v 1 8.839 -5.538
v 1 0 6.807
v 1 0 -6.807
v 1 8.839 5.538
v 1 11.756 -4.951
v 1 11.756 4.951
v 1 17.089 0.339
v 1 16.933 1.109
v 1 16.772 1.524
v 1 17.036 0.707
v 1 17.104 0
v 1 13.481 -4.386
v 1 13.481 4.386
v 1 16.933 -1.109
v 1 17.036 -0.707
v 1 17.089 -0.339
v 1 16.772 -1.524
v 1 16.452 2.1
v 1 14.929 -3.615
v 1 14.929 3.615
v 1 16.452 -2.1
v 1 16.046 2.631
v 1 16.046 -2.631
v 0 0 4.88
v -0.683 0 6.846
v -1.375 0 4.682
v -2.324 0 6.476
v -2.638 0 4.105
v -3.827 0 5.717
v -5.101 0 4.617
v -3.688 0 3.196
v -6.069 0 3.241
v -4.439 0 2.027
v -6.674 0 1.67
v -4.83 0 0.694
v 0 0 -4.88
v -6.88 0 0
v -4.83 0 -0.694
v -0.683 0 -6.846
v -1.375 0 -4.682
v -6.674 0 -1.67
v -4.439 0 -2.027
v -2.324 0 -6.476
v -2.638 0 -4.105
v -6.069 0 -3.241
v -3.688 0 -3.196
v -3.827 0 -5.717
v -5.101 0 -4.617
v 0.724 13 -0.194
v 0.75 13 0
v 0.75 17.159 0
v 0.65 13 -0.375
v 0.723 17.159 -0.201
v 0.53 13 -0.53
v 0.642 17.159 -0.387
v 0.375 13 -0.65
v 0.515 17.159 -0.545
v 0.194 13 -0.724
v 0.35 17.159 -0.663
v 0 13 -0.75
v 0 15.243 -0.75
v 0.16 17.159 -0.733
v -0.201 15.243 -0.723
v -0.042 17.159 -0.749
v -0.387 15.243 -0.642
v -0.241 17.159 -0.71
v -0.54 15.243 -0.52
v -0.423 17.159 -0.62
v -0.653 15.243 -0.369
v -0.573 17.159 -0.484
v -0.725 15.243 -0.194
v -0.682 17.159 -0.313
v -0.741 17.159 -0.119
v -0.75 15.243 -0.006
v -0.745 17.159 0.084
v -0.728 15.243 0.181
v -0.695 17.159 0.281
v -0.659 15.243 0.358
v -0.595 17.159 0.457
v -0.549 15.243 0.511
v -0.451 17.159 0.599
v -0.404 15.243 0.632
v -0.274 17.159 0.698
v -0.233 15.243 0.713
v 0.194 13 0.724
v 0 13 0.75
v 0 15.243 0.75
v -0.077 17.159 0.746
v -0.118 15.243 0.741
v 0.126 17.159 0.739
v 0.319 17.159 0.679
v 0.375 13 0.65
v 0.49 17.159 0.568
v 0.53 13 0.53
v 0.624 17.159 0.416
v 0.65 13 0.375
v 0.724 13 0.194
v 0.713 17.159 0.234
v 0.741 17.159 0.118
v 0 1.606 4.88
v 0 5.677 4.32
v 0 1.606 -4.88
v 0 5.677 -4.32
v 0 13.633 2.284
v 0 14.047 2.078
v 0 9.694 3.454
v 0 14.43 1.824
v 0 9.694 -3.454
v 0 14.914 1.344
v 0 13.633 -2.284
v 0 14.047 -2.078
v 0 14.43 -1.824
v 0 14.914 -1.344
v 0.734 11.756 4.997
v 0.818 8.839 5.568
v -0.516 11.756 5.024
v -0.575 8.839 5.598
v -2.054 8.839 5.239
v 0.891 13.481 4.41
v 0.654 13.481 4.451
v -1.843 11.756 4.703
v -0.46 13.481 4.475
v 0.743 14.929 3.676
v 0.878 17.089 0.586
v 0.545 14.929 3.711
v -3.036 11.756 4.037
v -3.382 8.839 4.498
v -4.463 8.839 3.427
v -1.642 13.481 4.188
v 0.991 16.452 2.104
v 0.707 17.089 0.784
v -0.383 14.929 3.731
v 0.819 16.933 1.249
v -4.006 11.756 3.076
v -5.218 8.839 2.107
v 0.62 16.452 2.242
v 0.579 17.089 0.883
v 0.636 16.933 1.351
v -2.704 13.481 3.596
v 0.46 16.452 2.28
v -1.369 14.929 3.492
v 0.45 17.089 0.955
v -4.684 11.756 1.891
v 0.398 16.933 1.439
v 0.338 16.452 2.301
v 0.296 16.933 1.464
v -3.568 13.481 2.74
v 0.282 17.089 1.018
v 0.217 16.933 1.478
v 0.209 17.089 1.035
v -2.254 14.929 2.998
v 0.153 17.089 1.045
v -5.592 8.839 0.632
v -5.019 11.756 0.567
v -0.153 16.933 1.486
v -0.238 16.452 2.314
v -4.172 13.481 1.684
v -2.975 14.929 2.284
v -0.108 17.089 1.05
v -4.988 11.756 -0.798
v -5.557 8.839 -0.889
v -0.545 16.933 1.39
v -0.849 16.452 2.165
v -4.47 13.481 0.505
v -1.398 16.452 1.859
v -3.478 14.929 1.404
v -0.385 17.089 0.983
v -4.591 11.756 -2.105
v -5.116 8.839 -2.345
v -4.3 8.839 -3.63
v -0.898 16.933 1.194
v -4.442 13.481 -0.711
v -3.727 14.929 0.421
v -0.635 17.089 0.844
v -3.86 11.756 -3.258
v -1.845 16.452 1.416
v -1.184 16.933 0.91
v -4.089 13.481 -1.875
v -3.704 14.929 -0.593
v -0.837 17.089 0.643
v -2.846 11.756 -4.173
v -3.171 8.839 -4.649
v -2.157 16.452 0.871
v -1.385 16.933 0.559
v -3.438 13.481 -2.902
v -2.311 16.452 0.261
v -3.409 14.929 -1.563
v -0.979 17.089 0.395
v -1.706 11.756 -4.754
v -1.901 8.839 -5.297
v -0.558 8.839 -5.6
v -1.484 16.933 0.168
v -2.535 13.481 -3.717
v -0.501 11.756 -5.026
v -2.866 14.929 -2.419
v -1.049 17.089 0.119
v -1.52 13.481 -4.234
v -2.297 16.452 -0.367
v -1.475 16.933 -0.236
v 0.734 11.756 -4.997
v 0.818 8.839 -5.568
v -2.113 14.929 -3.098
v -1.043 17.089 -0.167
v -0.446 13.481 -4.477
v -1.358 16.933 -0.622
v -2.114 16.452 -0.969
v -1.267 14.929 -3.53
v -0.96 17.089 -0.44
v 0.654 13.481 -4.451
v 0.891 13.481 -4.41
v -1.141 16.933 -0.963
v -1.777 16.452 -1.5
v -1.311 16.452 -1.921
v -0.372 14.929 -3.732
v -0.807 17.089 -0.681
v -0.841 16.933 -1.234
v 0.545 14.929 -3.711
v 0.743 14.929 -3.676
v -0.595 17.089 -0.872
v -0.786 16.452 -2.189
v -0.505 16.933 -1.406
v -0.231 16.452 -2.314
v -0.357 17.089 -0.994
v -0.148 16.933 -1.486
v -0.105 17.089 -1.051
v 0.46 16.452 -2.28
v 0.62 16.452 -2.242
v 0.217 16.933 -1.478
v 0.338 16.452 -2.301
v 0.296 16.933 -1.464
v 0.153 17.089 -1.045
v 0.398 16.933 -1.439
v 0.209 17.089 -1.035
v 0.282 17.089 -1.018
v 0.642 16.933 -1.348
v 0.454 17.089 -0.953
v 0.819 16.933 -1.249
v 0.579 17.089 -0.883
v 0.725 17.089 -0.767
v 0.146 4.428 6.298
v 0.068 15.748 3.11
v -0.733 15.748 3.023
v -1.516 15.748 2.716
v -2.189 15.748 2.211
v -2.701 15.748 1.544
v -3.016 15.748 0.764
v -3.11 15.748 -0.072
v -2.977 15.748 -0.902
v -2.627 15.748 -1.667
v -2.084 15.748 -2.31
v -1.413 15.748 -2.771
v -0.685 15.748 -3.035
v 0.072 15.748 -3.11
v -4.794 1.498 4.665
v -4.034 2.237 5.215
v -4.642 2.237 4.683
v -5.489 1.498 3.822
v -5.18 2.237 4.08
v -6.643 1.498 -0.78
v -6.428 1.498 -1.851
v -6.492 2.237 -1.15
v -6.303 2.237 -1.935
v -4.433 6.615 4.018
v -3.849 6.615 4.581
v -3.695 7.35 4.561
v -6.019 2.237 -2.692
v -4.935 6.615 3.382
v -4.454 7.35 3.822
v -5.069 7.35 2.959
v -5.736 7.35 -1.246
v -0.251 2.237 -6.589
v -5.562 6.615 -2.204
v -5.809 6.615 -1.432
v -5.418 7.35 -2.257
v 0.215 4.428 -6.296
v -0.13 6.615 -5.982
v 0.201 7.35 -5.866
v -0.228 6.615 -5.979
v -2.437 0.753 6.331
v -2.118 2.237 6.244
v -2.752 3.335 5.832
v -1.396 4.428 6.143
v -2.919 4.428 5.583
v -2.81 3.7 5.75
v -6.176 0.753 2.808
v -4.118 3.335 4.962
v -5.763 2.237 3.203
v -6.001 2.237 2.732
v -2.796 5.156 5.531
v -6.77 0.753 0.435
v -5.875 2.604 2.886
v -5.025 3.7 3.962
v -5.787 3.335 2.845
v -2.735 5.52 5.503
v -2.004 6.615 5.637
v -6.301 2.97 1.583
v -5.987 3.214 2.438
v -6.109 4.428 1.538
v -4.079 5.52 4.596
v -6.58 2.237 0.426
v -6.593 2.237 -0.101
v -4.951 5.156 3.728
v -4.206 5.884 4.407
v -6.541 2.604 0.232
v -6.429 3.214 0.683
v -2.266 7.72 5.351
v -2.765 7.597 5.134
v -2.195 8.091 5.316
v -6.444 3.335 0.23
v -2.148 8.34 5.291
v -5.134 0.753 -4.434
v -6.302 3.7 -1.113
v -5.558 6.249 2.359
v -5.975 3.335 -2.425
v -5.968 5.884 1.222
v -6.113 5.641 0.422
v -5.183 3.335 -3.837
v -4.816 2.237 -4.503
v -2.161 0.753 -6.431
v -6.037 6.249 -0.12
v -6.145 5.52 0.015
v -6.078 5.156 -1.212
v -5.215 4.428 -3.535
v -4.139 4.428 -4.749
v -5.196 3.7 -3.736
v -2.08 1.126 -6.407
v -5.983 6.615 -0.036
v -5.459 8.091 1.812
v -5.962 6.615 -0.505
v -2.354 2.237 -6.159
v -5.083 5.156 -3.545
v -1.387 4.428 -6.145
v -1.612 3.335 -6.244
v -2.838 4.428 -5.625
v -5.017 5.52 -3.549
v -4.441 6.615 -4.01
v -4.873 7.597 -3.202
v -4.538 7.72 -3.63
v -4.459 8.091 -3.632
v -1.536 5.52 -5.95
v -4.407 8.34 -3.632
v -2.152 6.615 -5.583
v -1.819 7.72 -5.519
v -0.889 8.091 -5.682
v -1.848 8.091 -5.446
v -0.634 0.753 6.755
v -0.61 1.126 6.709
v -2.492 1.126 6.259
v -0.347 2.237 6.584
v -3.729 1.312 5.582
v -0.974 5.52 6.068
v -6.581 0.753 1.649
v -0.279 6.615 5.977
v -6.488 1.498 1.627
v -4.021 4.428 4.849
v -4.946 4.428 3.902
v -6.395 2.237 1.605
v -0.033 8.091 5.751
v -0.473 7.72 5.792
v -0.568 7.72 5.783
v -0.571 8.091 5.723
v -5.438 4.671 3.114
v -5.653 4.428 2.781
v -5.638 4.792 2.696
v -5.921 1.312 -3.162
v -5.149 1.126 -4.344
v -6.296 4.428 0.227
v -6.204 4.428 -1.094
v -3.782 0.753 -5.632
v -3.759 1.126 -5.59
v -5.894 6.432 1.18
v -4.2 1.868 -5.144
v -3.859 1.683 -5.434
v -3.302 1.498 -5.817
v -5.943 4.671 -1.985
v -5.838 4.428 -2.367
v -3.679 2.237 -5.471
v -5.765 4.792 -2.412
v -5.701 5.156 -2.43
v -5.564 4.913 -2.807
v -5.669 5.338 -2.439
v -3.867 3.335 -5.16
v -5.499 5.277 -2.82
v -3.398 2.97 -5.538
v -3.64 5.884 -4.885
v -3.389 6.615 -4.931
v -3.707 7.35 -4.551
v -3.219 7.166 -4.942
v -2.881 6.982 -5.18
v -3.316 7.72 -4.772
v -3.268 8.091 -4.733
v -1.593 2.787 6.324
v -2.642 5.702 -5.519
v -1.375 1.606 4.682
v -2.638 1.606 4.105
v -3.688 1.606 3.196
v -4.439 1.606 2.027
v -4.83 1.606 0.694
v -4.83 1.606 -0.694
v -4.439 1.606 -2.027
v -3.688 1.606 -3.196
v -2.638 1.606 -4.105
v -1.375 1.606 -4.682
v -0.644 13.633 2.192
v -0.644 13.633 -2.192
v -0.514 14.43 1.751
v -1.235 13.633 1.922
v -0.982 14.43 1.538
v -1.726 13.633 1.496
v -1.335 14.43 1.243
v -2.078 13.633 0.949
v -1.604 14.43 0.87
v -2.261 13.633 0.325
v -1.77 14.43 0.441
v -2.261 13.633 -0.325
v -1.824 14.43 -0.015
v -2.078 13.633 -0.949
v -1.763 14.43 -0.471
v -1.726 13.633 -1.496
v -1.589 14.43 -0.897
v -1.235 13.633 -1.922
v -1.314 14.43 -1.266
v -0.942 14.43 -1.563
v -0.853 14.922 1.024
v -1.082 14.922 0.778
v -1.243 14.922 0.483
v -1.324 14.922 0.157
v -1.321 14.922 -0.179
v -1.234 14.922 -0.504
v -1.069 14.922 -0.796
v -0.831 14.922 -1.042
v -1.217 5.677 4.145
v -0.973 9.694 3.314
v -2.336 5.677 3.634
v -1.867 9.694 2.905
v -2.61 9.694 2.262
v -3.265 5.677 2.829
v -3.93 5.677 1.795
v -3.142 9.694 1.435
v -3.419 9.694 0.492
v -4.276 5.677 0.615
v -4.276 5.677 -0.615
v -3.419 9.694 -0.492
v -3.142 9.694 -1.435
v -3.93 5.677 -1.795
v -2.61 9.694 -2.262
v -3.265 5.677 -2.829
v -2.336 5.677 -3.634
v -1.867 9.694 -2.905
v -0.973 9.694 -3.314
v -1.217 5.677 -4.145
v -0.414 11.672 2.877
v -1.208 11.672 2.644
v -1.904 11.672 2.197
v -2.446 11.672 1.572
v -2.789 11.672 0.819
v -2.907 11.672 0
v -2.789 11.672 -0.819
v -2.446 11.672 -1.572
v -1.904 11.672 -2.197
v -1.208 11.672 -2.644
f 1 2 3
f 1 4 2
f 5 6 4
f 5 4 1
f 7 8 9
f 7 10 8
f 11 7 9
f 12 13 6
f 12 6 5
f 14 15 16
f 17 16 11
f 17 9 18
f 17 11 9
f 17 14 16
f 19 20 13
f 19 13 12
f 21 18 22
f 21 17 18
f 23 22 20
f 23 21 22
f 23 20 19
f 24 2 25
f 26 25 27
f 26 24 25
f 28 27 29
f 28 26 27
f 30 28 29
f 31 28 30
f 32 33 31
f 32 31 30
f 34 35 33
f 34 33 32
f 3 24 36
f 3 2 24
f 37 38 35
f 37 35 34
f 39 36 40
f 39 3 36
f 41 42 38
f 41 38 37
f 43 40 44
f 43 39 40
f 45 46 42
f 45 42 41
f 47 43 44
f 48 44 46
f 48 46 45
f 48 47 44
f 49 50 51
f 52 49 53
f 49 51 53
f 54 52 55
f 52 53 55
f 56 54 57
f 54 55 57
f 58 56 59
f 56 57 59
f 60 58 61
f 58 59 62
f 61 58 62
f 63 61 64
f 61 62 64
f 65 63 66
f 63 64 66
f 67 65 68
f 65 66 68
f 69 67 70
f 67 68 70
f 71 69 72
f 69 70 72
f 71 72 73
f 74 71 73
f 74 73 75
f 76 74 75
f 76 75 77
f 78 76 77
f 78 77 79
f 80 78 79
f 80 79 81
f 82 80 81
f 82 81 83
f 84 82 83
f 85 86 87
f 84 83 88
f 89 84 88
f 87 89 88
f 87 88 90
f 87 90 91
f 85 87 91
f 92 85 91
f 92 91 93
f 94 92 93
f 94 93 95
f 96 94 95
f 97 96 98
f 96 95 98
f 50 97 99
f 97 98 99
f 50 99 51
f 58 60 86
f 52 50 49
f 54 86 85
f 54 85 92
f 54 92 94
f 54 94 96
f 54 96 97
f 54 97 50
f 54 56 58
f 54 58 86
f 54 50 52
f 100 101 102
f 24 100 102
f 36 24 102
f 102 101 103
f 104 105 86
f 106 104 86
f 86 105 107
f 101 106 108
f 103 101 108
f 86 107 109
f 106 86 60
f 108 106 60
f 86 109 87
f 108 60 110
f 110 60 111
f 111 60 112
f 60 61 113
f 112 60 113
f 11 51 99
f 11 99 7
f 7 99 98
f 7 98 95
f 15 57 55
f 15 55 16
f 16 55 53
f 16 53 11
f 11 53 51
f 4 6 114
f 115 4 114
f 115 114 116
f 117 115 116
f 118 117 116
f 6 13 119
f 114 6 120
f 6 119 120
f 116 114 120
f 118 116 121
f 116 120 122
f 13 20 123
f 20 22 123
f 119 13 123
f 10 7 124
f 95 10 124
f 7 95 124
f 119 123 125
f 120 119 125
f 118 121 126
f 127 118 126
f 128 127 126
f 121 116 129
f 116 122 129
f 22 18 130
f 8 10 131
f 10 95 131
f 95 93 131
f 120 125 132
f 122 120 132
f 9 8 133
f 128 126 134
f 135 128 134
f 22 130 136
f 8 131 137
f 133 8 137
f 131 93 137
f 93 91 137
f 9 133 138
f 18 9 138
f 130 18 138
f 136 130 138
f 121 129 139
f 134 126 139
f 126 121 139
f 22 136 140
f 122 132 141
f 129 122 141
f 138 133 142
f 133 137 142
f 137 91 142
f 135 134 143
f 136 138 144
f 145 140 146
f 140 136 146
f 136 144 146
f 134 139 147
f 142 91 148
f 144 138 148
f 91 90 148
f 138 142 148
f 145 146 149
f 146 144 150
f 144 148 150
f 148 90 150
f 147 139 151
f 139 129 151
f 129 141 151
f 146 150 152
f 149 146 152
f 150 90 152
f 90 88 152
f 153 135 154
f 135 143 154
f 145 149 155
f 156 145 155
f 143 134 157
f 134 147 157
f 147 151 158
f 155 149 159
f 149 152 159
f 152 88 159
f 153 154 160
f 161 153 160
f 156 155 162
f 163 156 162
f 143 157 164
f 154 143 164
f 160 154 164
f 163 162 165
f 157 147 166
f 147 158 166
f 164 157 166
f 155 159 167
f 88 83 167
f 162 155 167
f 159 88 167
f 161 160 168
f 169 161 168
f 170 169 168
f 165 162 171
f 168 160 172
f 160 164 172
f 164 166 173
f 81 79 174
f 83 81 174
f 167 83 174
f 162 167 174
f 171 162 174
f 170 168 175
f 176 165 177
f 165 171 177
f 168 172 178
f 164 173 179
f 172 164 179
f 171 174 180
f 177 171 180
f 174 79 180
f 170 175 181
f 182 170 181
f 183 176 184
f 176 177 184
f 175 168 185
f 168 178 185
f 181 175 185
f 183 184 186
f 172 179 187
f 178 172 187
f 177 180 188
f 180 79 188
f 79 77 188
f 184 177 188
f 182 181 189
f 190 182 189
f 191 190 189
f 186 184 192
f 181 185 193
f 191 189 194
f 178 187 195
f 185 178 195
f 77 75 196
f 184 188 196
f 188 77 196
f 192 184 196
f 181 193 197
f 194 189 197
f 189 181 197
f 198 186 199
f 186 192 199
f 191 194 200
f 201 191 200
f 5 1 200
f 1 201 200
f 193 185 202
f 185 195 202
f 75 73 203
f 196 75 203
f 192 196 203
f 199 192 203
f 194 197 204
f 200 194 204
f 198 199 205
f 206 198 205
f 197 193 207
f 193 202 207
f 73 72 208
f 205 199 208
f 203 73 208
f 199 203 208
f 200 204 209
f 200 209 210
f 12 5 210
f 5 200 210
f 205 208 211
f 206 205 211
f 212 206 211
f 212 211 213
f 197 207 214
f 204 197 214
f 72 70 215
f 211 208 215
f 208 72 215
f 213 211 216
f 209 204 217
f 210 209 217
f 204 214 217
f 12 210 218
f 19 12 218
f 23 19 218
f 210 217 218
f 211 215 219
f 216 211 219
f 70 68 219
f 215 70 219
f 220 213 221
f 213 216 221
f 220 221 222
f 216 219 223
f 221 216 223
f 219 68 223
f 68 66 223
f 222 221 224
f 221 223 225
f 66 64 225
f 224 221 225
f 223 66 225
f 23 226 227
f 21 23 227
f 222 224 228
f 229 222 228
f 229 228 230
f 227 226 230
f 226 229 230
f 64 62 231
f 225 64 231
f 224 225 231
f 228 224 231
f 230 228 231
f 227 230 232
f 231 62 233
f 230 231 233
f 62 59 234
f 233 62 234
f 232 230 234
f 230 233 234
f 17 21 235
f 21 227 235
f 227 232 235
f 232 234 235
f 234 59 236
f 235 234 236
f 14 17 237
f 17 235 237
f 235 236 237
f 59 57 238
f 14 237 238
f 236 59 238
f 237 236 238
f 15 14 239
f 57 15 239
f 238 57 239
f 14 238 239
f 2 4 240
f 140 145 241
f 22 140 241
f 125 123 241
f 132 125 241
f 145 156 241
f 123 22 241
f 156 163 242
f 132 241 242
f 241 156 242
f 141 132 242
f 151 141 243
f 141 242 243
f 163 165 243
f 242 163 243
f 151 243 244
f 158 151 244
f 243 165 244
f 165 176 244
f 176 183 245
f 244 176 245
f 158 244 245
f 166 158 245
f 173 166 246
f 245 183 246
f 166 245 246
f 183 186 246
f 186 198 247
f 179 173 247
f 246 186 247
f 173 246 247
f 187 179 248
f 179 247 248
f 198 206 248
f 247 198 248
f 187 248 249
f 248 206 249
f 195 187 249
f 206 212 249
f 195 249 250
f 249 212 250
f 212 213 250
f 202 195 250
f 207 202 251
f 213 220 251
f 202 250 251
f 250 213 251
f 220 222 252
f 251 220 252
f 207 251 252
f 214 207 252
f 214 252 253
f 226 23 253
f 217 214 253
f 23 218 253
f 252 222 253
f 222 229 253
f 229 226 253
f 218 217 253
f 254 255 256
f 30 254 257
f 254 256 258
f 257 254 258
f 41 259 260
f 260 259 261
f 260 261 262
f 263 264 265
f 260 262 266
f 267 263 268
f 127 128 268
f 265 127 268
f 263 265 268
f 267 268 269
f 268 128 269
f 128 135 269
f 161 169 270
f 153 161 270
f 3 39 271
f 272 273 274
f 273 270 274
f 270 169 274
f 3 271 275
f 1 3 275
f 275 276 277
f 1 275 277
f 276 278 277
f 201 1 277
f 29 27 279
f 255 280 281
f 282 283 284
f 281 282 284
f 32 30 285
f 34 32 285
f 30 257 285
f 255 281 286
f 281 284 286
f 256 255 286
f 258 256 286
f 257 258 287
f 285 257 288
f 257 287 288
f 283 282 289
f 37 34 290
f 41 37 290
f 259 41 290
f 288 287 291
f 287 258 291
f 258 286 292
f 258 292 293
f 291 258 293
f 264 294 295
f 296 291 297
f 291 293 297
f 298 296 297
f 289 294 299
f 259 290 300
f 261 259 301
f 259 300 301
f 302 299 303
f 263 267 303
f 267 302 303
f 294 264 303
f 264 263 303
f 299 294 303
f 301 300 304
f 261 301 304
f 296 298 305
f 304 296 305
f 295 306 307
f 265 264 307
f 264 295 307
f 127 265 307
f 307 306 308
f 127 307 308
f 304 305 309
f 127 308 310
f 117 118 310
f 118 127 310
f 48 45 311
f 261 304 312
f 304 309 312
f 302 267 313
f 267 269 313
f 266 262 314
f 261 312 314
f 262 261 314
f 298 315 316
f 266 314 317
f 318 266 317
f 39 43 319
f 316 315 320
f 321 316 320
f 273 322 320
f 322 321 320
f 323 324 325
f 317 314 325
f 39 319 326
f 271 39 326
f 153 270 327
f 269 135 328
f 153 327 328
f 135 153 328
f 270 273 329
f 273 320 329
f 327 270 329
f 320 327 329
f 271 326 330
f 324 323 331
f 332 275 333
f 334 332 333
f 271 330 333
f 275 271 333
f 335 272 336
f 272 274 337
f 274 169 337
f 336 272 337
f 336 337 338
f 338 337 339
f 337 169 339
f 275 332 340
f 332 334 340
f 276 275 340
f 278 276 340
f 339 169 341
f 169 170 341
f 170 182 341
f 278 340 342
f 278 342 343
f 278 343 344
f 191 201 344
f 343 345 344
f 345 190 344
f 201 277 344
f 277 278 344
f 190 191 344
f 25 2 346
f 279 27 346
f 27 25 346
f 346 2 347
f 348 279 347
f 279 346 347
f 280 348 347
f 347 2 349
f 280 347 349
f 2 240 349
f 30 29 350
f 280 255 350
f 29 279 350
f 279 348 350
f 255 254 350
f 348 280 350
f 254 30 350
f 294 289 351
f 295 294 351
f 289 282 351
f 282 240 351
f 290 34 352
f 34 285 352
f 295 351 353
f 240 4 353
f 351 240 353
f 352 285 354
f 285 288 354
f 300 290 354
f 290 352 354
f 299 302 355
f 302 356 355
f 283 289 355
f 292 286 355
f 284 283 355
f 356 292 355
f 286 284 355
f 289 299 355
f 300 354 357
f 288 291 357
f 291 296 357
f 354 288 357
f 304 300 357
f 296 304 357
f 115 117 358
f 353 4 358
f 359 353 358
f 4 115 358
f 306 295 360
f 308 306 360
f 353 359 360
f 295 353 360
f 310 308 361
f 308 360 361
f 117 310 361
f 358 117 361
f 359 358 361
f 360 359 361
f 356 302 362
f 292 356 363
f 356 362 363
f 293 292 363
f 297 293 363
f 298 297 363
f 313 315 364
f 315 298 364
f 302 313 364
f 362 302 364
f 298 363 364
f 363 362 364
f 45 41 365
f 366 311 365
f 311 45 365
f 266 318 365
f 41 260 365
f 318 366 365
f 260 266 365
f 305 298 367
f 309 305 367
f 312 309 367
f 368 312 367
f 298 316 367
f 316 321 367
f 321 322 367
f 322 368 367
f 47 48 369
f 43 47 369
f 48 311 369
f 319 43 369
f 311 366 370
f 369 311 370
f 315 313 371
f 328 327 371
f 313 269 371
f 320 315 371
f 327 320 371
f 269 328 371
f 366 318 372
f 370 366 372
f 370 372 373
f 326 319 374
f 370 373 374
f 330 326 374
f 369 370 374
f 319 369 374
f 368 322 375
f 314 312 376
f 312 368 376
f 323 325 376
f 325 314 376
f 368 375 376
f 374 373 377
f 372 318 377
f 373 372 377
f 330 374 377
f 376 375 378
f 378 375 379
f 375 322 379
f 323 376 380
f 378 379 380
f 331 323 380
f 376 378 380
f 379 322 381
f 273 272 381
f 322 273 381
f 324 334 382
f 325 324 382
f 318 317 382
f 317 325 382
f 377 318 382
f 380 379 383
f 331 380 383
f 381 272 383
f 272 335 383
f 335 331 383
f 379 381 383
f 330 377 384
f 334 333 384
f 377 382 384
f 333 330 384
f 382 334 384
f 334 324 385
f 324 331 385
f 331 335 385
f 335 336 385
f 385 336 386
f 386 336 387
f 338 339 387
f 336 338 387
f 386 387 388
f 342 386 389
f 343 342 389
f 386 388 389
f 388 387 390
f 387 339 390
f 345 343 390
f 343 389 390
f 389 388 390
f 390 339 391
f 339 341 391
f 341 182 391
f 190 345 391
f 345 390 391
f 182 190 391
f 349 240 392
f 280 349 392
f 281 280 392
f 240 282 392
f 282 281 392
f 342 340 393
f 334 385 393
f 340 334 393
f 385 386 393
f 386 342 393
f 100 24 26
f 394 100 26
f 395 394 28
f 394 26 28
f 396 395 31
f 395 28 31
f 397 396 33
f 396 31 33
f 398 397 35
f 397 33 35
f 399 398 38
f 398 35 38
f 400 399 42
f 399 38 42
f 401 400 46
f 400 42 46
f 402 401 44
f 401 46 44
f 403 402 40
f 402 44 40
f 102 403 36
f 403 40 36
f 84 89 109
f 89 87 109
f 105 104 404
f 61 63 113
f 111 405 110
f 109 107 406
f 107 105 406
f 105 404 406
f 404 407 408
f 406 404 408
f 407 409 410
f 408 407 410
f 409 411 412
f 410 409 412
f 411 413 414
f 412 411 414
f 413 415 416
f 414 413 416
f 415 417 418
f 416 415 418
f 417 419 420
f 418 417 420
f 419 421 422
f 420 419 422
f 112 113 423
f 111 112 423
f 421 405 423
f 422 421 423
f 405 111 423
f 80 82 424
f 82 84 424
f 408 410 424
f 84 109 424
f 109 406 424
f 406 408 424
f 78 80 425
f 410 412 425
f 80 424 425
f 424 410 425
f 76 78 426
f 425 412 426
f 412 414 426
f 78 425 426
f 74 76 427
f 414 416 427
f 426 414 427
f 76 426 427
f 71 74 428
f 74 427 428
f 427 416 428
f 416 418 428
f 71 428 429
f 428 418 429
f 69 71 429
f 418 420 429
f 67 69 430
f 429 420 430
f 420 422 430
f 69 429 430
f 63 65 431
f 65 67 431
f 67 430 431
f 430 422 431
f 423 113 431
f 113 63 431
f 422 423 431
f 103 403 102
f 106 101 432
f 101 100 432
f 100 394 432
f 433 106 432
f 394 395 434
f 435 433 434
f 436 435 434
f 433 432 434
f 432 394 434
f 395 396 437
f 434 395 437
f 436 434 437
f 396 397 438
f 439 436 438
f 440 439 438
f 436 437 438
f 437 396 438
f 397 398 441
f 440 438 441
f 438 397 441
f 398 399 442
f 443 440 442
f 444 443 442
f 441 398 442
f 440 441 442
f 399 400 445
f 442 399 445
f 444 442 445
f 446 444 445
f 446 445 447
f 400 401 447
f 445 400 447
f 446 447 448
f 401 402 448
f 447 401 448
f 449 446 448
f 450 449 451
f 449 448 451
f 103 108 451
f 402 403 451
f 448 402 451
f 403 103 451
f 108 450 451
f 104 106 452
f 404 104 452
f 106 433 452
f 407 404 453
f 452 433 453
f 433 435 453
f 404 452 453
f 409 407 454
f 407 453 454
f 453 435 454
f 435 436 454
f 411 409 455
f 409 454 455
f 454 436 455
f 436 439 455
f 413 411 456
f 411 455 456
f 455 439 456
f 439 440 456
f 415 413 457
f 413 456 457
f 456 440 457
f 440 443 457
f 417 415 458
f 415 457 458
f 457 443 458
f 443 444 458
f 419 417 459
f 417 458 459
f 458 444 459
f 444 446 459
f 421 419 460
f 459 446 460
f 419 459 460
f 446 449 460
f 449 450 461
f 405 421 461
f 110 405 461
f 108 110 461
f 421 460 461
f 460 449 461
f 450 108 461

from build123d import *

# Parameters (mm, degrees)
SKETCH2_R                = 0.5
CUT_EXTRUDE2_DEPTH       = 18.207691702
SKETCH5_W                = 5
SKETCH5_H                = 18
CUT_EXTRUDE4_DEPTH       = 20
REVOLVE3_ANGLE           = 90
REVOLVE3_OTHER_WAY_ANGLE = 90
SKETCH12_W               = 15.157920946
SKETCH12_H               = 18.962900337
CUT_EXTRUDE5_DEPTH       = 9
SKETCH14_R               = 0.5
CUT_EXTRUDE6_DEPTH       = 6
SKETCH15_R               = 0.75
CUT_EXTRUDE7_DEPTH       = 7


with BuildPart() as part:
    # Sketch1 → Revolve1 (revolve)
    with BuildSketch(Plane.XY):
        with BuildLine():
            Line((4.88, 0), (6.88, 0))
            add(Edge.make_bspline(
                [(6.88, 0), (6.476901655, 3.177692832), (5.808868292, 8.357754247), (4.378289276, 15.464596201), (1.111060579, 17.280233516), (0, 17.2)],
                knots=[0, 0, 0, 0, 0.473754928, 0.838492431, 1, 1, 1, 1], degree=3))
            Line((0, 17.2), (0, 15.4))
            add(Edge.make_bspline(
                [(0, 15.4), (1.563029619, 15.297760208), (2.284243197, 13.63319745)],
                knots=[0, 0, 0, 1, 1, 1], degree=2))
            add(Edge.make_bspline(
                [(2.284243197, 13.63319745), (4.266259497, 7.778351244), (4.88, 1.606249126)],
                knots=[0, 0, 0, 1, 1, 1], degree=2))
            ThreePointArc((4.88, 1.606249126), (4.905839008, 0.803124563), (4.88, 0))
        make_face()
    revolve(axis=Axis((0, 18.057905706, 0), (0, -1, 0)))

    # Sketch2 → Cut-Extrude2 (cut, through all)
    with BuildSketch(Plane(origin=(0, 0, 0), x_dir=(1, 0, 0), z_dir=(0, 1, 0))):
        Circle(SKETCH2_R)
    extrude(amount=CUT_EXTRUDE2_DEPTH, mode=Mode.SUBTRACT)

    # Sketch5 → Cut-Extrude4 (cut)
    with BuildSketch(Plane.XZ):
        with Locations((4.5, 0.912005105)):
            Rectangle(SKETCH5_W, SKETCH5_H)
    extrude(amount=-CUT_EXTRUDE4_DEPTH, mode=Mode.SUBTRACT)

    # Sketch9 → Revolve3 (revolve)
    with BuildSketch(Plane.XY):
        with BuildLine():
            Line((0, 17.2), (0, 0))
            Line((0, 0), (4.88, 0))
            Line((4.88, 0), (6.88, 0))
            add(Edge.make_bspline(
                [(6.88, 0), (6.476901655, 3.177692832), (5.808868292, 8.357754247), (4.378289276, 15.464596201), (1.111060579, 17.280233516), (0, 17.2)],
                knots=[0, 0, 0, 0, 0.473754928, 0.838492431, 1, 1, 1, 1], degree=3))
        make_face()
    revolve(axis=Axis((0, 17.2, 0), (0, -1, 0)), revolution_arc=REVOLVE3_ANGLE)

    # Sketch9 → Revolve3 other way (revolve)
    with BuildSketch(Plane.XY):
        with BuildLine():
            Line((0, 17.2), (0, 0))
            Line((0, 0), (4.88, 0))
            Line((4.88, 0), (6.88, 0))
            add(Edge.make_bspline(
                [(6.88, 0), (6.476901655, 3.177692832), (5.808868292, 8.357754247), (4.378289276, 15.464596201), (1.111060579, 17.280233516), (0, 17.2)],
                knots=[0, 0, 0, 0, 0.473754928, 0.838492431, 1, 1, 1, 1], degree=3))
        make_face()
    revolve(axis=Axis((0, 17.2, 0), (0, 1, 0)), revolution_arc=REVOLVE3_OTHER_WAY_ANGLE)

    # Sketch12 → Cut-Extrude5 (cut)
    with BuildSketch(Plane(origin=(10, 0, 0), x_dir=(0, 0, -1), z_dir=(1, 0, 0))):
        with Locations((0, 8.631516603)):
            Rectangle(SKETCH12_W, SKETCH12_H)
    extrude(amount=-CUT_EXTRUDE5_DEPTH, mode=Mode.SUBTRACT)

    # Sketch14 → Cut-Extrude6 (cut)
    with BuildSketch(Plane(origin=(0, 20, 0), x_dir=(1, 0, 0), z_dir=(0, 1, 0))):
        Circle(SKETCH14_R)
    extrude(amount=-CUT_EXTRUDE6_DEPTH, mode=Mode.SUBTRACT)

    # Sketch15 → Cut-Extrude7 (cut)
    with BuildSketch(Plane(origin=(0, 20, 0), x_dir=(1, 0, 0), z_dir=(0, 1, 0))):
        Circle(SKETCH15_R)
    extrude(amount=-CUT_EXTRUDE7_DEPTH, mode=Mode.SUBTRACT)


solid = part.part
